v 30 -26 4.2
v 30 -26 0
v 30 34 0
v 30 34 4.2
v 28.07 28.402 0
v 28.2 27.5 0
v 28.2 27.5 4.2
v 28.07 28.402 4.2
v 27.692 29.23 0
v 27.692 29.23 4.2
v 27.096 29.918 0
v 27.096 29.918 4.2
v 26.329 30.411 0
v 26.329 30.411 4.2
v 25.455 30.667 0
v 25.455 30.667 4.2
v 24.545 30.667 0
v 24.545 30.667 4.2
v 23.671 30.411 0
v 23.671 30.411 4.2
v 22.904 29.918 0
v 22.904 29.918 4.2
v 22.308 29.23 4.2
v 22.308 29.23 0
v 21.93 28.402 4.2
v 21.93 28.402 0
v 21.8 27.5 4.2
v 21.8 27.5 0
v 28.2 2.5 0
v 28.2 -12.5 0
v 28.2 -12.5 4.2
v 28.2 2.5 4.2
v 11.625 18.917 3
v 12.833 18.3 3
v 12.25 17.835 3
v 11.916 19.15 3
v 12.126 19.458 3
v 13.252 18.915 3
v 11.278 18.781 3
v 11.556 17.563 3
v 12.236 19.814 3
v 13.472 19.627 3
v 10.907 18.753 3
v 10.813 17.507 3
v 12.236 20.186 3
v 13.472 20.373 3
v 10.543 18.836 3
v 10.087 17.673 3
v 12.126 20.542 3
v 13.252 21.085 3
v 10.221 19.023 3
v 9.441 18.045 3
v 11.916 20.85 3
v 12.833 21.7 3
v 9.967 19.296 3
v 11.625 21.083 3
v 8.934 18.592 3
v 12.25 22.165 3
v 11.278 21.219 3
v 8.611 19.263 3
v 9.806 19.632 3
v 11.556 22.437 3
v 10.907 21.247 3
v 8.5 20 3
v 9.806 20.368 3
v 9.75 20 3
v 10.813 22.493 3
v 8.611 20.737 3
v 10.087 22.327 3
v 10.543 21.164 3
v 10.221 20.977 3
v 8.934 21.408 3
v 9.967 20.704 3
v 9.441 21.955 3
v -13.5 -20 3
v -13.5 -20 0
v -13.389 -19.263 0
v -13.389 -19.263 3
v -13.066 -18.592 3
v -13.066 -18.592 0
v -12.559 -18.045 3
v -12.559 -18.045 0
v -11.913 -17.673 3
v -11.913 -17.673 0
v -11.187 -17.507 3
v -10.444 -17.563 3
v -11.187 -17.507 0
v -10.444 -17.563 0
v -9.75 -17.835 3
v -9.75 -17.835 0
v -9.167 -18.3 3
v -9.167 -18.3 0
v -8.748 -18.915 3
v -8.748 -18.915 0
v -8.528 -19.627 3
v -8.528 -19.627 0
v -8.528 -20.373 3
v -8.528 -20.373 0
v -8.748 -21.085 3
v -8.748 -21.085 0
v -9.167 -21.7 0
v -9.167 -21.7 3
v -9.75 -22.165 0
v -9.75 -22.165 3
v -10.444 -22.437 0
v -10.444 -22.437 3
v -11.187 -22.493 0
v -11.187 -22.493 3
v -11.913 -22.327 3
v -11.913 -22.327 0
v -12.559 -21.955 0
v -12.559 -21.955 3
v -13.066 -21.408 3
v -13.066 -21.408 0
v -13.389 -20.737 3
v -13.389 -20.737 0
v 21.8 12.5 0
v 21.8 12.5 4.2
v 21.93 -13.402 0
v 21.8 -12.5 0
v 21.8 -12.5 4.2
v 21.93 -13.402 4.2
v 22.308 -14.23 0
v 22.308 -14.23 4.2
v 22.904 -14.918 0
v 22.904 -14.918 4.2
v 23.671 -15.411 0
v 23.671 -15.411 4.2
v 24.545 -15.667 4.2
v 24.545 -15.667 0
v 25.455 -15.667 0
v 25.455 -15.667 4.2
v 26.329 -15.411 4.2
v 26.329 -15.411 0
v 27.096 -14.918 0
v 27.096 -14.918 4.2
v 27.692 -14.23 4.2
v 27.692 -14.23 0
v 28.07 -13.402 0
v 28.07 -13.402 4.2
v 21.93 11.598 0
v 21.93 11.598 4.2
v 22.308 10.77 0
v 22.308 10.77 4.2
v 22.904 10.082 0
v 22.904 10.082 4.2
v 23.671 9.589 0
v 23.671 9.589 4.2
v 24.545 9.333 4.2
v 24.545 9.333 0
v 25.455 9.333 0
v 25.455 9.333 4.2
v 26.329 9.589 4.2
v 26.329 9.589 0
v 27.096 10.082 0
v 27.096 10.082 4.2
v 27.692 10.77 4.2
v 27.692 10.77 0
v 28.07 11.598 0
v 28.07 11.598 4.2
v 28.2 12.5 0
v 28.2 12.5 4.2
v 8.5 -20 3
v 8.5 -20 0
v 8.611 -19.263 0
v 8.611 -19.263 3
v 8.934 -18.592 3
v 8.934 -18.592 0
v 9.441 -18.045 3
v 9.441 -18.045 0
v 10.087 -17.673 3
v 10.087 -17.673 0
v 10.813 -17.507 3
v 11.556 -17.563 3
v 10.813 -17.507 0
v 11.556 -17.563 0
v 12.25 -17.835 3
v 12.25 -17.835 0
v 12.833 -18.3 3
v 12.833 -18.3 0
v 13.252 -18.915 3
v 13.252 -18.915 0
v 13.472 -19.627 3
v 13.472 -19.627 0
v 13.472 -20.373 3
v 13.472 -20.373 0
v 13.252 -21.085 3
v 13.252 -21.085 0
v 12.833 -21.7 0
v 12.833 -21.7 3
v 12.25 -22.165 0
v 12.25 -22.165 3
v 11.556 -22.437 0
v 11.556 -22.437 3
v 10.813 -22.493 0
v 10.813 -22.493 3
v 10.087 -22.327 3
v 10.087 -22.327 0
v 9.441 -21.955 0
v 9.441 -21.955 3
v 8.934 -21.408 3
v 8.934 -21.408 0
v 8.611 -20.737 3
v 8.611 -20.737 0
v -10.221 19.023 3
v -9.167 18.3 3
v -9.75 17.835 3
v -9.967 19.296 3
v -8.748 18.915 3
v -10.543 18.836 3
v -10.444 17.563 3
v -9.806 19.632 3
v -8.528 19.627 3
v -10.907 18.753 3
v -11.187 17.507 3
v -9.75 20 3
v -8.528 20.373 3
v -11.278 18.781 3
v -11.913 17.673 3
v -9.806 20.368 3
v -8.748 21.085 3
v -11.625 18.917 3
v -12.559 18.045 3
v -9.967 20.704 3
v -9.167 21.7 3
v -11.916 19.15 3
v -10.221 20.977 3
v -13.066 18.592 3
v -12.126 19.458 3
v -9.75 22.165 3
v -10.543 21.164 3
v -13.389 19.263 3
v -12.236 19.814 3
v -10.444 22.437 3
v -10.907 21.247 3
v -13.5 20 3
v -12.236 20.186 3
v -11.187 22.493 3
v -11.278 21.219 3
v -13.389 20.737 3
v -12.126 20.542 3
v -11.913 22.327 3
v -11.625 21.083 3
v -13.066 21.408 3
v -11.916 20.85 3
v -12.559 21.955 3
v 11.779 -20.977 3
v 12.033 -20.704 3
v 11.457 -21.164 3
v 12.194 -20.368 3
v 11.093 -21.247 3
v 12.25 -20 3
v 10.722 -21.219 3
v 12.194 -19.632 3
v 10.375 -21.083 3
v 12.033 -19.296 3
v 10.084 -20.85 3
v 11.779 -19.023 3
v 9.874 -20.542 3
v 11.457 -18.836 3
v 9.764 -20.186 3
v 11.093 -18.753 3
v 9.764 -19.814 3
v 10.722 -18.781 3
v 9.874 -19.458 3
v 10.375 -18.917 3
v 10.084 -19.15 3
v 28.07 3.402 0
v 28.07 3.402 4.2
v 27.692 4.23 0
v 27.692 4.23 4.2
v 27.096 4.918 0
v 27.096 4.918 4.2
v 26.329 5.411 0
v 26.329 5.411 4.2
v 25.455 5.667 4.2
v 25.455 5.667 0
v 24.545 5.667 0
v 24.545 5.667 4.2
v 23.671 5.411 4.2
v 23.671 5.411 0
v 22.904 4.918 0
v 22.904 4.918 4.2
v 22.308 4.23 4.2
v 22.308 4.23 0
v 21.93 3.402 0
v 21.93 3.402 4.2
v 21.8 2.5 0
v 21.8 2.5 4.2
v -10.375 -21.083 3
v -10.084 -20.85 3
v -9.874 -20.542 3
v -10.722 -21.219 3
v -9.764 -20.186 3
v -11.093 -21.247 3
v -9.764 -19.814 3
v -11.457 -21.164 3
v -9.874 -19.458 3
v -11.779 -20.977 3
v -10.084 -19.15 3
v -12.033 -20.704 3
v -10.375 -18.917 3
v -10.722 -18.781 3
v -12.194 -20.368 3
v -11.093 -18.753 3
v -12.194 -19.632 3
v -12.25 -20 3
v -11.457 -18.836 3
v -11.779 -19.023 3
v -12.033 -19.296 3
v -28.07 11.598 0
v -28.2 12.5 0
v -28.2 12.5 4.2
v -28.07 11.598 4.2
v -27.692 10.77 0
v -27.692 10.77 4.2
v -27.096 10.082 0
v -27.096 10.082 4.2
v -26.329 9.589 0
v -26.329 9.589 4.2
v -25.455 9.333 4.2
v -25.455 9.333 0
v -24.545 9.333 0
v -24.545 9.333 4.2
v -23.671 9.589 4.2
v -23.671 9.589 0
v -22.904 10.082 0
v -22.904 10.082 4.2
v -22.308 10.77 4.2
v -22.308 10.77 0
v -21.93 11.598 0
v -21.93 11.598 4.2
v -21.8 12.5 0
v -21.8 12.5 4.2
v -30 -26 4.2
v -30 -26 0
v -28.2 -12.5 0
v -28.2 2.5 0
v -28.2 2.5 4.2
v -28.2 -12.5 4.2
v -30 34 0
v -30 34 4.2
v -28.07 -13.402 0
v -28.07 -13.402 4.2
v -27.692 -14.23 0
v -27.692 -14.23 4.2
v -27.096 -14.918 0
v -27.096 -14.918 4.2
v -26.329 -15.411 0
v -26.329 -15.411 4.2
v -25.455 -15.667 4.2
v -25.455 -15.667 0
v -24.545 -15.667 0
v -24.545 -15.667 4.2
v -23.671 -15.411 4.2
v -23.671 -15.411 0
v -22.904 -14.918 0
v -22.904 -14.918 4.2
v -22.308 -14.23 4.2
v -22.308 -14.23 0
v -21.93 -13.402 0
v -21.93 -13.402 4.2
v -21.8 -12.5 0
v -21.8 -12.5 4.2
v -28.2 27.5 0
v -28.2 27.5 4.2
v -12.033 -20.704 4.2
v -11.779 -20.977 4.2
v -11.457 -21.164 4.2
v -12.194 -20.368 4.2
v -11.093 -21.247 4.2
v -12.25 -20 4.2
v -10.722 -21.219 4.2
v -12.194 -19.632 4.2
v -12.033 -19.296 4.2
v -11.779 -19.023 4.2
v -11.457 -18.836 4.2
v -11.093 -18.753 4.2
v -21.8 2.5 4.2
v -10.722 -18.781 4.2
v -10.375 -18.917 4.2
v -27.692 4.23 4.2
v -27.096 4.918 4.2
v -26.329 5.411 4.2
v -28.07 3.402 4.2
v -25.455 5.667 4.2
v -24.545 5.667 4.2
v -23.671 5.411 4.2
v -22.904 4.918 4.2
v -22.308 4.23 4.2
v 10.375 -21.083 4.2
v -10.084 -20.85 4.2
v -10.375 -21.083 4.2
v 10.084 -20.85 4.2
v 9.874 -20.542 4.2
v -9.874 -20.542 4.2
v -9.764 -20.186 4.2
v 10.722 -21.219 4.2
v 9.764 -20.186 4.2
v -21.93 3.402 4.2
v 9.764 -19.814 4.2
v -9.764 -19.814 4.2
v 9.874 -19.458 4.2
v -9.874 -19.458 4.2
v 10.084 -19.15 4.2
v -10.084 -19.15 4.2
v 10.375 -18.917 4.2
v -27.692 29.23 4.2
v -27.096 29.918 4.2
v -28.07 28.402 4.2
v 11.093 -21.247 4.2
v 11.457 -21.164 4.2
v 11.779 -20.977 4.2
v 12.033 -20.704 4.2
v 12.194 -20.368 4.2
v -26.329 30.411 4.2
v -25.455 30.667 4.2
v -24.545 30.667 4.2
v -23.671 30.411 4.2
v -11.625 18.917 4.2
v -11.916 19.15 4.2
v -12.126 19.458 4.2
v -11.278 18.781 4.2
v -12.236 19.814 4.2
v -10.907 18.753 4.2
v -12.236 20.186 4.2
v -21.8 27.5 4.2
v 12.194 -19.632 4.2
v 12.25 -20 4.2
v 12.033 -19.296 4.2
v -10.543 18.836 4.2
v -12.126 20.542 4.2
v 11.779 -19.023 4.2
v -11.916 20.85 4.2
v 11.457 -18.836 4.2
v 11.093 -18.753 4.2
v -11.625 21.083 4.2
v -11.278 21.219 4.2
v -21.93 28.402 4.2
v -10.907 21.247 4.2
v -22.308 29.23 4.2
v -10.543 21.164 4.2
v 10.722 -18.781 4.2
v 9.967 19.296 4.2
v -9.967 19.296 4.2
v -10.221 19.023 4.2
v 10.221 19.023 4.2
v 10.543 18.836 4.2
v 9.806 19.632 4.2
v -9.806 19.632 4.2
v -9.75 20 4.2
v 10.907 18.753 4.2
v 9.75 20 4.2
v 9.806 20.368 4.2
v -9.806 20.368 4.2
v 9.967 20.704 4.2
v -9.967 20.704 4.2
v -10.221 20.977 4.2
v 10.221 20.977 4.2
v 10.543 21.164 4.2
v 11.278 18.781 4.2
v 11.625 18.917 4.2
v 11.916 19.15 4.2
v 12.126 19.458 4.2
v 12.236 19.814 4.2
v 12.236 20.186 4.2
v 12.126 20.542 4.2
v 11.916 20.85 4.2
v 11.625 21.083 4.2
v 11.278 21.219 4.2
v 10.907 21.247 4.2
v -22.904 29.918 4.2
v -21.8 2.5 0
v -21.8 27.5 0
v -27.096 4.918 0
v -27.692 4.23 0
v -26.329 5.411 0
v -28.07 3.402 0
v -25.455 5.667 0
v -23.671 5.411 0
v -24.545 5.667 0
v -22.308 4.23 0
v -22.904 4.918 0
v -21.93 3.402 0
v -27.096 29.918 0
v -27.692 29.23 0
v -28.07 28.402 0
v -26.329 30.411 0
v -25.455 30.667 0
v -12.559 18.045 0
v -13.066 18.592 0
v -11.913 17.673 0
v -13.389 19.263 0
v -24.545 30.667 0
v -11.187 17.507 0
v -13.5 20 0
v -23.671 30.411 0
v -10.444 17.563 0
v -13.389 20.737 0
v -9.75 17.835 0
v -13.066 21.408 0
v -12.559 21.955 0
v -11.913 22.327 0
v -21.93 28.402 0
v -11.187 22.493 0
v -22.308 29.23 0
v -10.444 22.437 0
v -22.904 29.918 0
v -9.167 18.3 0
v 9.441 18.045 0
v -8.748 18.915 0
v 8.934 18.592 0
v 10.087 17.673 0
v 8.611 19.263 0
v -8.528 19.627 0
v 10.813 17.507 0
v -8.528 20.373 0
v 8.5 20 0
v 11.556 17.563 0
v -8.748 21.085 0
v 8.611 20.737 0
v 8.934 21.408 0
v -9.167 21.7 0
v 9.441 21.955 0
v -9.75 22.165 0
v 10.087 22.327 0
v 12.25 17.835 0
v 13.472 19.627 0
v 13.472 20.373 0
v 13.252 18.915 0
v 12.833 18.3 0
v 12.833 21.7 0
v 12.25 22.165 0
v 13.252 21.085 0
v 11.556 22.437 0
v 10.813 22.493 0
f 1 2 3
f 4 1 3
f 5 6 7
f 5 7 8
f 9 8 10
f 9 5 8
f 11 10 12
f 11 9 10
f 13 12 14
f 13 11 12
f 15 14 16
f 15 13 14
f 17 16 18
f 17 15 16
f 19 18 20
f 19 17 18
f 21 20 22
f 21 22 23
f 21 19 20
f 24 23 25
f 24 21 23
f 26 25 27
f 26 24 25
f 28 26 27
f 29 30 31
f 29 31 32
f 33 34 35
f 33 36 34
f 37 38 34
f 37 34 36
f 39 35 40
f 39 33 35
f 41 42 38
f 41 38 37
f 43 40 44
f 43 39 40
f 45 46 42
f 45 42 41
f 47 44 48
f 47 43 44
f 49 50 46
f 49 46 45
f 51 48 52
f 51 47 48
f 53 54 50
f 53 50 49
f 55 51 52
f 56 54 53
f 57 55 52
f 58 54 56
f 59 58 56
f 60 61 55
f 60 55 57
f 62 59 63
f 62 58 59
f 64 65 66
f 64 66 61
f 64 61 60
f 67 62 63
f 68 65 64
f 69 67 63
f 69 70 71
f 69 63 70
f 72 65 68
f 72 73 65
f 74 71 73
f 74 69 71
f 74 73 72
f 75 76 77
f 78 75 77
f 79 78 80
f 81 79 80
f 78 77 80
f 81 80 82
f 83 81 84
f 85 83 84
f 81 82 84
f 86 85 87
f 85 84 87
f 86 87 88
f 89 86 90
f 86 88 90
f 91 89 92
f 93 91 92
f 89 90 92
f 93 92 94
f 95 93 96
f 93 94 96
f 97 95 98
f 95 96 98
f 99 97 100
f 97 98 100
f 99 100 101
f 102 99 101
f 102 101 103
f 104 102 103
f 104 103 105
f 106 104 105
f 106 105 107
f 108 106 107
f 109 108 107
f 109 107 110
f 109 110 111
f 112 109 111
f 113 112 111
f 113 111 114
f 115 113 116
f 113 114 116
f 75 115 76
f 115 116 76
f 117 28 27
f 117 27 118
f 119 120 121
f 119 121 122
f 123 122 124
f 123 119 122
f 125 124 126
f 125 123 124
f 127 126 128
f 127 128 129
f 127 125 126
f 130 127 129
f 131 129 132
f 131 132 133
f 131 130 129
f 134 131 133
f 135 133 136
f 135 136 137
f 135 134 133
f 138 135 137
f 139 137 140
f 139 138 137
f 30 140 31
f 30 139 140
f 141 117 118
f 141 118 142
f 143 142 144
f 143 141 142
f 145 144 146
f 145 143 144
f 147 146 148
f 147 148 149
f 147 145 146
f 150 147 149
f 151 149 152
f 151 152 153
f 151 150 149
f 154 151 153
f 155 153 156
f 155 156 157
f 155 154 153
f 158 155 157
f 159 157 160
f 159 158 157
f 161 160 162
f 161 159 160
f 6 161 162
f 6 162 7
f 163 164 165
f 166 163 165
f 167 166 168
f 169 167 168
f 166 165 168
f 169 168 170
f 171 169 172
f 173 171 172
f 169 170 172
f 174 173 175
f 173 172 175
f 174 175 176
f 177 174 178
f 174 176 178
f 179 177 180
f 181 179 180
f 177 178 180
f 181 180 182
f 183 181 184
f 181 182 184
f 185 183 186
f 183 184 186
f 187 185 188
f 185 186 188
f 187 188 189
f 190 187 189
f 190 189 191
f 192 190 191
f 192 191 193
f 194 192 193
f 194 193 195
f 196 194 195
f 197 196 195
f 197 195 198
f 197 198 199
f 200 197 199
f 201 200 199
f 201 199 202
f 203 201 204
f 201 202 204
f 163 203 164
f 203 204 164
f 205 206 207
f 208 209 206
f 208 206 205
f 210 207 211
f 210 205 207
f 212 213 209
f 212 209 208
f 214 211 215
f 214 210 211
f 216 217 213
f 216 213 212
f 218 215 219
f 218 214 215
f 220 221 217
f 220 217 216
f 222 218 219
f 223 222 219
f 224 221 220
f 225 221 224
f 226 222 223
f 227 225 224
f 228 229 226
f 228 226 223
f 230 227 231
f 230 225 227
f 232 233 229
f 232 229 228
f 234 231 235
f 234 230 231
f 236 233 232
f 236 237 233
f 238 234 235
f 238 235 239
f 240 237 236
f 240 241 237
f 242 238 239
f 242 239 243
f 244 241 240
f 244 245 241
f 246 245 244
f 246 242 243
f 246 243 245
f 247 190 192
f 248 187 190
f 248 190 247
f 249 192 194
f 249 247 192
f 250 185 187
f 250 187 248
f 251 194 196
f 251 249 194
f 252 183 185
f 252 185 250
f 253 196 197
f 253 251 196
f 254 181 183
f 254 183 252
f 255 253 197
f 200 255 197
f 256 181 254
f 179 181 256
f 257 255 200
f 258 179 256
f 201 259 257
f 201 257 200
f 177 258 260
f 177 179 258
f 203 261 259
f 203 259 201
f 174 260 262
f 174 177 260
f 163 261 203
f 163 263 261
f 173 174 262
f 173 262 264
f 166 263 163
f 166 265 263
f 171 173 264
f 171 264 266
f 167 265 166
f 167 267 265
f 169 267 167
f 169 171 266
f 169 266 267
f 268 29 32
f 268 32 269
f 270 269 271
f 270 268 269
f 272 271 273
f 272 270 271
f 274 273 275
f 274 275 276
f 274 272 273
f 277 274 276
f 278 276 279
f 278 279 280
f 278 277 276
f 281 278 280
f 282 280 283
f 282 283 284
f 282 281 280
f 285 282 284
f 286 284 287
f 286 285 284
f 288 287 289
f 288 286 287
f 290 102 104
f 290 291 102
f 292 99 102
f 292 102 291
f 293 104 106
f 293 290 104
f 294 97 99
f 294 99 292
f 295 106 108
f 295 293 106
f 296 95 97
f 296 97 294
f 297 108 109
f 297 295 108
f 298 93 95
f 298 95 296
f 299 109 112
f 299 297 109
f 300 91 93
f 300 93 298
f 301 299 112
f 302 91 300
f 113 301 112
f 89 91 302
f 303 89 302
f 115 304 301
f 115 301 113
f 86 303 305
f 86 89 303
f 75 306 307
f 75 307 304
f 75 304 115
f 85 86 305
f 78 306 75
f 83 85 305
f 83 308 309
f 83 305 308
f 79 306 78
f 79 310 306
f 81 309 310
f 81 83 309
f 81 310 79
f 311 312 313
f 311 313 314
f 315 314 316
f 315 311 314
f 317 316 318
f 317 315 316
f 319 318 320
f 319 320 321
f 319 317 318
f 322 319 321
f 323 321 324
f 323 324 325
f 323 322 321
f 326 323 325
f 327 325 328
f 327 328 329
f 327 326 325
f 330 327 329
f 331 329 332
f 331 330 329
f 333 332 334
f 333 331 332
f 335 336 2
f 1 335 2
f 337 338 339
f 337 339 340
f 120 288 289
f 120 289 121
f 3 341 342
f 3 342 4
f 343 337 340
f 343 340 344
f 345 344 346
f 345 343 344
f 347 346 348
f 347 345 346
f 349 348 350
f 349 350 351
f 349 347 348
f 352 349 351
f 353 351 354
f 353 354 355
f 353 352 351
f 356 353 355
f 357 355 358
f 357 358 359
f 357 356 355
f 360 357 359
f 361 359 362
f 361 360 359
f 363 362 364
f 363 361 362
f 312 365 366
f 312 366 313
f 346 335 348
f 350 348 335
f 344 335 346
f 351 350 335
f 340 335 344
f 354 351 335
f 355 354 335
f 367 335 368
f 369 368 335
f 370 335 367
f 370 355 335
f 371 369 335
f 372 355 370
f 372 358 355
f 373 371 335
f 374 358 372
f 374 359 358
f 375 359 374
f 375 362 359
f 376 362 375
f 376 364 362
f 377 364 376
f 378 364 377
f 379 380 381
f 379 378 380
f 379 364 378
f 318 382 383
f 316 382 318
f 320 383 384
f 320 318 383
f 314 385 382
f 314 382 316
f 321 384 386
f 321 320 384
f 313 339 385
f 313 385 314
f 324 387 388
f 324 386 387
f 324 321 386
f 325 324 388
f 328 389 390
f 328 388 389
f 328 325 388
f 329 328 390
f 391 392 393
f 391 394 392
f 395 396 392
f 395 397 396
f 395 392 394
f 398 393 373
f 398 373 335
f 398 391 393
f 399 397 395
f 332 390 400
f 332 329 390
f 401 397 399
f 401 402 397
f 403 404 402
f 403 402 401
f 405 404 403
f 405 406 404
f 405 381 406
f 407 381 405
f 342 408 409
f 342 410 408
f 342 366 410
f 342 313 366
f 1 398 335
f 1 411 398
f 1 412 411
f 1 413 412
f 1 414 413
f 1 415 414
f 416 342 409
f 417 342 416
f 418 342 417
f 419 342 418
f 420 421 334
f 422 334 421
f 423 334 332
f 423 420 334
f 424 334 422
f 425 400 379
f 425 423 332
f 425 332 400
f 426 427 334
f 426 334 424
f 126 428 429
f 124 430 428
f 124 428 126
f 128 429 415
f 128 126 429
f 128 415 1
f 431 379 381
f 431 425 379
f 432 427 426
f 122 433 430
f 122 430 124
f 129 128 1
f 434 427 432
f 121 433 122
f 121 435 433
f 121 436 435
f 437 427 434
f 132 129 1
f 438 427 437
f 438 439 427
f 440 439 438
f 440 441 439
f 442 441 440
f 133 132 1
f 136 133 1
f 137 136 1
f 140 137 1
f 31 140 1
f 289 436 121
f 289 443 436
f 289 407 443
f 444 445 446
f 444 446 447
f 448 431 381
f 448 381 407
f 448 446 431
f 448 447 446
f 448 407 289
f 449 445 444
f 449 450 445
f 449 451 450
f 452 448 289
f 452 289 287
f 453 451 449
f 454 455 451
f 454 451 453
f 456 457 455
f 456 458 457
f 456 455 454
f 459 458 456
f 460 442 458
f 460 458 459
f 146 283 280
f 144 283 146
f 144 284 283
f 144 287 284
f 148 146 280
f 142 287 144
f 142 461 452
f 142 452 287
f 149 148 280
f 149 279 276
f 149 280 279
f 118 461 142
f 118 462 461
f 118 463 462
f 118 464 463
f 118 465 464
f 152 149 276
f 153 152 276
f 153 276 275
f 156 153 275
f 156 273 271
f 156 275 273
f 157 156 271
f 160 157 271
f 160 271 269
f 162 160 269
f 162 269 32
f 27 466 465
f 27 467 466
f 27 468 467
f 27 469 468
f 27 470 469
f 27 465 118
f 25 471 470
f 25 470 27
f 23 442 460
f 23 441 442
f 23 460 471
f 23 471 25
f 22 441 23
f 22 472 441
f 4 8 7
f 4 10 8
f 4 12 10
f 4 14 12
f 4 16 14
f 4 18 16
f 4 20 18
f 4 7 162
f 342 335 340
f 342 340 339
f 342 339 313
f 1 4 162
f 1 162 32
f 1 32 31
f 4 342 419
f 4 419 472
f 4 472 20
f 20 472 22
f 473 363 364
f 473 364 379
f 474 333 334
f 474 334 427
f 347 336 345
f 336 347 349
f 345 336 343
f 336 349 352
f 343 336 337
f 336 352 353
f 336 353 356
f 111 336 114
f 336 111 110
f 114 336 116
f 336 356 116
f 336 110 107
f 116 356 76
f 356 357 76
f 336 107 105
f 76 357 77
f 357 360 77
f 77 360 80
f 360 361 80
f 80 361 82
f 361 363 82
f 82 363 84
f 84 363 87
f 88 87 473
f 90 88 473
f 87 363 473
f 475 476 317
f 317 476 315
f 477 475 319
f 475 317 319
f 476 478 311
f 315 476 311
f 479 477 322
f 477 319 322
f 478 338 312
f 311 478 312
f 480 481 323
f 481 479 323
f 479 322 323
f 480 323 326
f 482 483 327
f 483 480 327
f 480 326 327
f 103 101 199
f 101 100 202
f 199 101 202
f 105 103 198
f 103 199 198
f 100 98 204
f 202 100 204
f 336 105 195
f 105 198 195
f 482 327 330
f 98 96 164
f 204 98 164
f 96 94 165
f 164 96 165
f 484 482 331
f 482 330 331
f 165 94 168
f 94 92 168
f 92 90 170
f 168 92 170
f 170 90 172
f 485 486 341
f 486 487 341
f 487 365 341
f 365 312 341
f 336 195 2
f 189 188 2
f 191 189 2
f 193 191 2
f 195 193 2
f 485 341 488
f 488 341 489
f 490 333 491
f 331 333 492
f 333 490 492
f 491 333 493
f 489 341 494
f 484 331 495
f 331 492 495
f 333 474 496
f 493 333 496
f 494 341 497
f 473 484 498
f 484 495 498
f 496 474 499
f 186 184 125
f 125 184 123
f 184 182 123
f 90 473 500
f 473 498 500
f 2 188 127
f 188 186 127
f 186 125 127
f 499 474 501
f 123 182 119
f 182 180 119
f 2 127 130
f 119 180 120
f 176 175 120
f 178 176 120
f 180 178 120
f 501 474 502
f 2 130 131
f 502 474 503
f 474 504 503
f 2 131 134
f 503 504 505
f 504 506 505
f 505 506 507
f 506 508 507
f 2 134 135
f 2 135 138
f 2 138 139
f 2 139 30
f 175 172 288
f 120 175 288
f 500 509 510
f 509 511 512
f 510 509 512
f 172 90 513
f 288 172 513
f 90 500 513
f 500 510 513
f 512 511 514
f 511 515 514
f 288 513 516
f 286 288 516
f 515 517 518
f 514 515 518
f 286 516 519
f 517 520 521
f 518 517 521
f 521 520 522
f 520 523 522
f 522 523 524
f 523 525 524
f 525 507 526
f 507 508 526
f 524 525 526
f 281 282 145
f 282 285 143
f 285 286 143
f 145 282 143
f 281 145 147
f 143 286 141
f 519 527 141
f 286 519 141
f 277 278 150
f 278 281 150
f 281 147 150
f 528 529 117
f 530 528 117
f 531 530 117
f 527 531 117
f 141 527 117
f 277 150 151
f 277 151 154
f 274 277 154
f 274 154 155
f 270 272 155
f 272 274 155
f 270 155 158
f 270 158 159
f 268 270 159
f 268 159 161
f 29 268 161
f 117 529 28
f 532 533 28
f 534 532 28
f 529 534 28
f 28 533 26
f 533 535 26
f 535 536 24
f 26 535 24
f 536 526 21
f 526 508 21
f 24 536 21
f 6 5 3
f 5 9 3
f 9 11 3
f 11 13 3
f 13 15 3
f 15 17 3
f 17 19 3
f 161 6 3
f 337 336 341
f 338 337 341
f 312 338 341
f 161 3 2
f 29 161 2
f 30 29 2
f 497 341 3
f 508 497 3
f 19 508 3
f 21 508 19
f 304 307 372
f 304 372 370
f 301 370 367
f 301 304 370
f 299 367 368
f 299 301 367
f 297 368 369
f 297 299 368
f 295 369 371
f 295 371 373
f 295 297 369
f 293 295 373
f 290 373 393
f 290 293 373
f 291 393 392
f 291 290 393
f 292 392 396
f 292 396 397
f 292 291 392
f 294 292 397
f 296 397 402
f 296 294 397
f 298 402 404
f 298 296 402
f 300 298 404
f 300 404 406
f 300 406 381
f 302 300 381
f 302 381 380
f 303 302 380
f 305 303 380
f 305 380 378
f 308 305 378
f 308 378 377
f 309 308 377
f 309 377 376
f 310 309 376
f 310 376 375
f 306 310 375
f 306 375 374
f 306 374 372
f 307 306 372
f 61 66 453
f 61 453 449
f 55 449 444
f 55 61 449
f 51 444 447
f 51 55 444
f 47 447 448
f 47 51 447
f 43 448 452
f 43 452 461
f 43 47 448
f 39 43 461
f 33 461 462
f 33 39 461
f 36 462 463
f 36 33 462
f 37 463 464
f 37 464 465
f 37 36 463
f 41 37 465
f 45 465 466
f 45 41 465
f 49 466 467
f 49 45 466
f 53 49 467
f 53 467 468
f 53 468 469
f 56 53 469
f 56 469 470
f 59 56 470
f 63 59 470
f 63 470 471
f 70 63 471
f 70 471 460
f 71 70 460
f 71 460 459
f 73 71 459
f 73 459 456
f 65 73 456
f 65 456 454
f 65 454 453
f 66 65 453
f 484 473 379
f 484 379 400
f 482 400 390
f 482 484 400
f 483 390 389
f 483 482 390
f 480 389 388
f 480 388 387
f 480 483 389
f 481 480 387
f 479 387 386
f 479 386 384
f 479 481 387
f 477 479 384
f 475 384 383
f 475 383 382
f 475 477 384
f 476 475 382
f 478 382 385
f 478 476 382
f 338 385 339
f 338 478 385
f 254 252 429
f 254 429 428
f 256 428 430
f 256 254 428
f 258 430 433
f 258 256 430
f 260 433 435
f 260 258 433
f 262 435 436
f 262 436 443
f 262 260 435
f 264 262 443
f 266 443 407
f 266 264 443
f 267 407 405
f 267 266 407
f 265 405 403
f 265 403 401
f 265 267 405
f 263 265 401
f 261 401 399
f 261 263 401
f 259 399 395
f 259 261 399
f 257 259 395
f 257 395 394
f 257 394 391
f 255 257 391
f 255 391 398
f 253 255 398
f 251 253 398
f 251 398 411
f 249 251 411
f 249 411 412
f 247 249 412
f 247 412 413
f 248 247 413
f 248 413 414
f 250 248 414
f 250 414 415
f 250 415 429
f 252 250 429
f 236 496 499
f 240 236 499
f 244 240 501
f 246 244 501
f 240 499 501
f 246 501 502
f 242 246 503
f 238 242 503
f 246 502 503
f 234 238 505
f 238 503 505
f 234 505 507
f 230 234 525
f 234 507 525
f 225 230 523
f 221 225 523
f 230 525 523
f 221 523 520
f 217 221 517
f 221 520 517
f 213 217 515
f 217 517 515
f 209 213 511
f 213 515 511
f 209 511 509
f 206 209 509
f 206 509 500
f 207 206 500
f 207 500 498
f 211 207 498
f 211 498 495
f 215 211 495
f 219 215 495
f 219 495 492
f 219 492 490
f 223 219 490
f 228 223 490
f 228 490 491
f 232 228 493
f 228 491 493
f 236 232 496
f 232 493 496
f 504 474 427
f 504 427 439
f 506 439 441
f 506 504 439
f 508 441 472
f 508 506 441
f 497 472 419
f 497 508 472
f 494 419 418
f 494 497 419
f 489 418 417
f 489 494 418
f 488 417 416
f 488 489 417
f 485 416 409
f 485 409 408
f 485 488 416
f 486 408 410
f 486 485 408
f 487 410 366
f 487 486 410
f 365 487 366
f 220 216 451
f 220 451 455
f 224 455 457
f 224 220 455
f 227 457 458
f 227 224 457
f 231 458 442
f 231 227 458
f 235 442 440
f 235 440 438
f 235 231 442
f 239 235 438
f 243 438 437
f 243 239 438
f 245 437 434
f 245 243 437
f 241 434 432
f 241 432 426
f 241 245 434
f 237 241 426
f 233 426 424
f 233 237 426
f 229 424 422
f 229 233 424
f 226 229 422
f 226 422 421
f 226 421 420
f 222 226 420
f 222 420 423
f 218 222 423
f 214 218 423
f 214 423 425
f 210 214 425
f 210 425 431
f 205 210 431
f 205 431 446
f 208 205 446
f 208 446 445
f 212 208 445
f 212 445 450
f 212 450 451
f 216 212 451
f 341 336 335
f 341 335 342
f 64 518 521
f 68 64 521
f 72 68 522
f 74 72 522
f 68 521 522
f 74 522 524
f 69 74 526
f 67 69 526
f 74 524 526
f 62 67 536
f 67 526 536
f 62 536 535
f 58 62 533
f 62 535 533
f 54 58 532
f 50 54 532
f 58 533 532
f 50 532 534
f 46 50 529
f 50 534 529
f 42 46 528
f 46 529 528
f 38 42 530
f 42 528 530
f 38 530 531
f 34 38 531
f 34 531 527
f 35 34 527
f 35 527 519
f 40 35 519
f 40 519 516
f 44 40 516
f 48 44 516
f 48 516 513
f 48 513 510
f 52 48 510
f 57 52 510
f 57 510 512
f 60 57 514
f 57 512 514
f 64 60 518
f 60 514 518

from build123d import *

# Parameters (mm, degrees)
SKETCH_1_W          = 60
SKETCH_1_H          = 60
SKETCH_1_R          = 1.25
EXTRUDE_1_DEPTH     = 4.2
SKETCH_3_R          = 2.5
CUT_EXTRUDE_2_DEPTH = 3


with BuildPart() as part:
    # 스케치1 → 보스-돌출1 (new body)
    with BuildSketch(Plane.XY):
        with Locations((0, 4)):
            Rectangle(SKETCH_1_W, SKETCH_1_H)
        with Locations((-11, 20)):
            Circle(SKETCH_1_R, mode=Mode.SUBTRACT)
        with Locations(Location((-11, -20, 0), (0, 0, 180))):
            Circle(SKETCH_1_R, mode=Mode.SUBTRACT)
        with Locations((11, -20)):
            Circle(SKETCH_1_R, mode=Mode.SUBTRACT)
        with Locations(Location((11, 20, 0), (0, 0, 180))):
            Circle(SKETCH_1_R, mode=Mode.SUBTRACT)
        with BuildLine():
            Line((-28.2, 27.5), (-28.2, 12.5))
            ThreePointArc((-28.2, 12.5), (-25, 9.3), (-21.8, 12.5))
            Line((-21.8, 12.5), (-21.8, 27.5))
            ThreePointArc((-21.8, 27.5), (-25, 30.7), (-28.2, 27.5))
        make_face(mode=Mode.SUBTRACT)
        with BuildLine():
            Line((-28.2, 2.5), (-28.2, -12.5))
            ThreePointArc((-28.2, -12.5), (-25, -15.7), (-21.8, -12.5))
            Line((-21.8, -12.5), (-21.8, 2.5))
            ThreePointArc((-21.8, 2.5), (-25, 5.7), (-28.2, 2.5))
        make_face(mode=Mode.SUBTRACT)
        with BuildLine():
            Line((21.8, 27.5), (21.8, 12.5))
            ThreePointArc((21.8, 12.5), (25, 9.3), (28.2, 12.5))
            Line((28.2, 12.5), (28.2, 27.5))
            ThreePointArc((28.2, 27.5), (25, 30.7), (21.8, 27.5))
        make_face(mode=Mode.SUBTRACT)
        with BuildLine():
            Line((21.8, 2.5), (21.8, -12.5))
            ThreePointArc((21.8, -12.5), (25, -15.7), (28.2, -12.5))
            Line((28.2, -12.5), (28.2, 2.5))
            ThreePointArc((28.2, 2.5), (25, 5.7), (21.8, 2.5))
        make_face(mode=Mode.SUBTRACT)
    extrude(amount=EXTRUDE_1_DEPTH)

    # 스케치3 → 컷-돌출2 (cut)
    with BuildSketch(Plane(origin=(0, 0, 0), x_dir=(-1, 0, 0), z_dir=(0, 0, -1))):
        with Locations((-11, 20)):
            Circle(SKETCH_3_R)
        with Locations((11, 20)):
            Circle(SKETCH_3_R)
        with Locations((-11, -20)):
            Circle(SKETCH_3_R)
        with Locations((11, -20)):
            Circle(SKETCH_3_R)
    extrude(amount=-CUT_EXTRUDE_2_DEPTH, mode=Mode.SUBTRACT)


solid = part.part
